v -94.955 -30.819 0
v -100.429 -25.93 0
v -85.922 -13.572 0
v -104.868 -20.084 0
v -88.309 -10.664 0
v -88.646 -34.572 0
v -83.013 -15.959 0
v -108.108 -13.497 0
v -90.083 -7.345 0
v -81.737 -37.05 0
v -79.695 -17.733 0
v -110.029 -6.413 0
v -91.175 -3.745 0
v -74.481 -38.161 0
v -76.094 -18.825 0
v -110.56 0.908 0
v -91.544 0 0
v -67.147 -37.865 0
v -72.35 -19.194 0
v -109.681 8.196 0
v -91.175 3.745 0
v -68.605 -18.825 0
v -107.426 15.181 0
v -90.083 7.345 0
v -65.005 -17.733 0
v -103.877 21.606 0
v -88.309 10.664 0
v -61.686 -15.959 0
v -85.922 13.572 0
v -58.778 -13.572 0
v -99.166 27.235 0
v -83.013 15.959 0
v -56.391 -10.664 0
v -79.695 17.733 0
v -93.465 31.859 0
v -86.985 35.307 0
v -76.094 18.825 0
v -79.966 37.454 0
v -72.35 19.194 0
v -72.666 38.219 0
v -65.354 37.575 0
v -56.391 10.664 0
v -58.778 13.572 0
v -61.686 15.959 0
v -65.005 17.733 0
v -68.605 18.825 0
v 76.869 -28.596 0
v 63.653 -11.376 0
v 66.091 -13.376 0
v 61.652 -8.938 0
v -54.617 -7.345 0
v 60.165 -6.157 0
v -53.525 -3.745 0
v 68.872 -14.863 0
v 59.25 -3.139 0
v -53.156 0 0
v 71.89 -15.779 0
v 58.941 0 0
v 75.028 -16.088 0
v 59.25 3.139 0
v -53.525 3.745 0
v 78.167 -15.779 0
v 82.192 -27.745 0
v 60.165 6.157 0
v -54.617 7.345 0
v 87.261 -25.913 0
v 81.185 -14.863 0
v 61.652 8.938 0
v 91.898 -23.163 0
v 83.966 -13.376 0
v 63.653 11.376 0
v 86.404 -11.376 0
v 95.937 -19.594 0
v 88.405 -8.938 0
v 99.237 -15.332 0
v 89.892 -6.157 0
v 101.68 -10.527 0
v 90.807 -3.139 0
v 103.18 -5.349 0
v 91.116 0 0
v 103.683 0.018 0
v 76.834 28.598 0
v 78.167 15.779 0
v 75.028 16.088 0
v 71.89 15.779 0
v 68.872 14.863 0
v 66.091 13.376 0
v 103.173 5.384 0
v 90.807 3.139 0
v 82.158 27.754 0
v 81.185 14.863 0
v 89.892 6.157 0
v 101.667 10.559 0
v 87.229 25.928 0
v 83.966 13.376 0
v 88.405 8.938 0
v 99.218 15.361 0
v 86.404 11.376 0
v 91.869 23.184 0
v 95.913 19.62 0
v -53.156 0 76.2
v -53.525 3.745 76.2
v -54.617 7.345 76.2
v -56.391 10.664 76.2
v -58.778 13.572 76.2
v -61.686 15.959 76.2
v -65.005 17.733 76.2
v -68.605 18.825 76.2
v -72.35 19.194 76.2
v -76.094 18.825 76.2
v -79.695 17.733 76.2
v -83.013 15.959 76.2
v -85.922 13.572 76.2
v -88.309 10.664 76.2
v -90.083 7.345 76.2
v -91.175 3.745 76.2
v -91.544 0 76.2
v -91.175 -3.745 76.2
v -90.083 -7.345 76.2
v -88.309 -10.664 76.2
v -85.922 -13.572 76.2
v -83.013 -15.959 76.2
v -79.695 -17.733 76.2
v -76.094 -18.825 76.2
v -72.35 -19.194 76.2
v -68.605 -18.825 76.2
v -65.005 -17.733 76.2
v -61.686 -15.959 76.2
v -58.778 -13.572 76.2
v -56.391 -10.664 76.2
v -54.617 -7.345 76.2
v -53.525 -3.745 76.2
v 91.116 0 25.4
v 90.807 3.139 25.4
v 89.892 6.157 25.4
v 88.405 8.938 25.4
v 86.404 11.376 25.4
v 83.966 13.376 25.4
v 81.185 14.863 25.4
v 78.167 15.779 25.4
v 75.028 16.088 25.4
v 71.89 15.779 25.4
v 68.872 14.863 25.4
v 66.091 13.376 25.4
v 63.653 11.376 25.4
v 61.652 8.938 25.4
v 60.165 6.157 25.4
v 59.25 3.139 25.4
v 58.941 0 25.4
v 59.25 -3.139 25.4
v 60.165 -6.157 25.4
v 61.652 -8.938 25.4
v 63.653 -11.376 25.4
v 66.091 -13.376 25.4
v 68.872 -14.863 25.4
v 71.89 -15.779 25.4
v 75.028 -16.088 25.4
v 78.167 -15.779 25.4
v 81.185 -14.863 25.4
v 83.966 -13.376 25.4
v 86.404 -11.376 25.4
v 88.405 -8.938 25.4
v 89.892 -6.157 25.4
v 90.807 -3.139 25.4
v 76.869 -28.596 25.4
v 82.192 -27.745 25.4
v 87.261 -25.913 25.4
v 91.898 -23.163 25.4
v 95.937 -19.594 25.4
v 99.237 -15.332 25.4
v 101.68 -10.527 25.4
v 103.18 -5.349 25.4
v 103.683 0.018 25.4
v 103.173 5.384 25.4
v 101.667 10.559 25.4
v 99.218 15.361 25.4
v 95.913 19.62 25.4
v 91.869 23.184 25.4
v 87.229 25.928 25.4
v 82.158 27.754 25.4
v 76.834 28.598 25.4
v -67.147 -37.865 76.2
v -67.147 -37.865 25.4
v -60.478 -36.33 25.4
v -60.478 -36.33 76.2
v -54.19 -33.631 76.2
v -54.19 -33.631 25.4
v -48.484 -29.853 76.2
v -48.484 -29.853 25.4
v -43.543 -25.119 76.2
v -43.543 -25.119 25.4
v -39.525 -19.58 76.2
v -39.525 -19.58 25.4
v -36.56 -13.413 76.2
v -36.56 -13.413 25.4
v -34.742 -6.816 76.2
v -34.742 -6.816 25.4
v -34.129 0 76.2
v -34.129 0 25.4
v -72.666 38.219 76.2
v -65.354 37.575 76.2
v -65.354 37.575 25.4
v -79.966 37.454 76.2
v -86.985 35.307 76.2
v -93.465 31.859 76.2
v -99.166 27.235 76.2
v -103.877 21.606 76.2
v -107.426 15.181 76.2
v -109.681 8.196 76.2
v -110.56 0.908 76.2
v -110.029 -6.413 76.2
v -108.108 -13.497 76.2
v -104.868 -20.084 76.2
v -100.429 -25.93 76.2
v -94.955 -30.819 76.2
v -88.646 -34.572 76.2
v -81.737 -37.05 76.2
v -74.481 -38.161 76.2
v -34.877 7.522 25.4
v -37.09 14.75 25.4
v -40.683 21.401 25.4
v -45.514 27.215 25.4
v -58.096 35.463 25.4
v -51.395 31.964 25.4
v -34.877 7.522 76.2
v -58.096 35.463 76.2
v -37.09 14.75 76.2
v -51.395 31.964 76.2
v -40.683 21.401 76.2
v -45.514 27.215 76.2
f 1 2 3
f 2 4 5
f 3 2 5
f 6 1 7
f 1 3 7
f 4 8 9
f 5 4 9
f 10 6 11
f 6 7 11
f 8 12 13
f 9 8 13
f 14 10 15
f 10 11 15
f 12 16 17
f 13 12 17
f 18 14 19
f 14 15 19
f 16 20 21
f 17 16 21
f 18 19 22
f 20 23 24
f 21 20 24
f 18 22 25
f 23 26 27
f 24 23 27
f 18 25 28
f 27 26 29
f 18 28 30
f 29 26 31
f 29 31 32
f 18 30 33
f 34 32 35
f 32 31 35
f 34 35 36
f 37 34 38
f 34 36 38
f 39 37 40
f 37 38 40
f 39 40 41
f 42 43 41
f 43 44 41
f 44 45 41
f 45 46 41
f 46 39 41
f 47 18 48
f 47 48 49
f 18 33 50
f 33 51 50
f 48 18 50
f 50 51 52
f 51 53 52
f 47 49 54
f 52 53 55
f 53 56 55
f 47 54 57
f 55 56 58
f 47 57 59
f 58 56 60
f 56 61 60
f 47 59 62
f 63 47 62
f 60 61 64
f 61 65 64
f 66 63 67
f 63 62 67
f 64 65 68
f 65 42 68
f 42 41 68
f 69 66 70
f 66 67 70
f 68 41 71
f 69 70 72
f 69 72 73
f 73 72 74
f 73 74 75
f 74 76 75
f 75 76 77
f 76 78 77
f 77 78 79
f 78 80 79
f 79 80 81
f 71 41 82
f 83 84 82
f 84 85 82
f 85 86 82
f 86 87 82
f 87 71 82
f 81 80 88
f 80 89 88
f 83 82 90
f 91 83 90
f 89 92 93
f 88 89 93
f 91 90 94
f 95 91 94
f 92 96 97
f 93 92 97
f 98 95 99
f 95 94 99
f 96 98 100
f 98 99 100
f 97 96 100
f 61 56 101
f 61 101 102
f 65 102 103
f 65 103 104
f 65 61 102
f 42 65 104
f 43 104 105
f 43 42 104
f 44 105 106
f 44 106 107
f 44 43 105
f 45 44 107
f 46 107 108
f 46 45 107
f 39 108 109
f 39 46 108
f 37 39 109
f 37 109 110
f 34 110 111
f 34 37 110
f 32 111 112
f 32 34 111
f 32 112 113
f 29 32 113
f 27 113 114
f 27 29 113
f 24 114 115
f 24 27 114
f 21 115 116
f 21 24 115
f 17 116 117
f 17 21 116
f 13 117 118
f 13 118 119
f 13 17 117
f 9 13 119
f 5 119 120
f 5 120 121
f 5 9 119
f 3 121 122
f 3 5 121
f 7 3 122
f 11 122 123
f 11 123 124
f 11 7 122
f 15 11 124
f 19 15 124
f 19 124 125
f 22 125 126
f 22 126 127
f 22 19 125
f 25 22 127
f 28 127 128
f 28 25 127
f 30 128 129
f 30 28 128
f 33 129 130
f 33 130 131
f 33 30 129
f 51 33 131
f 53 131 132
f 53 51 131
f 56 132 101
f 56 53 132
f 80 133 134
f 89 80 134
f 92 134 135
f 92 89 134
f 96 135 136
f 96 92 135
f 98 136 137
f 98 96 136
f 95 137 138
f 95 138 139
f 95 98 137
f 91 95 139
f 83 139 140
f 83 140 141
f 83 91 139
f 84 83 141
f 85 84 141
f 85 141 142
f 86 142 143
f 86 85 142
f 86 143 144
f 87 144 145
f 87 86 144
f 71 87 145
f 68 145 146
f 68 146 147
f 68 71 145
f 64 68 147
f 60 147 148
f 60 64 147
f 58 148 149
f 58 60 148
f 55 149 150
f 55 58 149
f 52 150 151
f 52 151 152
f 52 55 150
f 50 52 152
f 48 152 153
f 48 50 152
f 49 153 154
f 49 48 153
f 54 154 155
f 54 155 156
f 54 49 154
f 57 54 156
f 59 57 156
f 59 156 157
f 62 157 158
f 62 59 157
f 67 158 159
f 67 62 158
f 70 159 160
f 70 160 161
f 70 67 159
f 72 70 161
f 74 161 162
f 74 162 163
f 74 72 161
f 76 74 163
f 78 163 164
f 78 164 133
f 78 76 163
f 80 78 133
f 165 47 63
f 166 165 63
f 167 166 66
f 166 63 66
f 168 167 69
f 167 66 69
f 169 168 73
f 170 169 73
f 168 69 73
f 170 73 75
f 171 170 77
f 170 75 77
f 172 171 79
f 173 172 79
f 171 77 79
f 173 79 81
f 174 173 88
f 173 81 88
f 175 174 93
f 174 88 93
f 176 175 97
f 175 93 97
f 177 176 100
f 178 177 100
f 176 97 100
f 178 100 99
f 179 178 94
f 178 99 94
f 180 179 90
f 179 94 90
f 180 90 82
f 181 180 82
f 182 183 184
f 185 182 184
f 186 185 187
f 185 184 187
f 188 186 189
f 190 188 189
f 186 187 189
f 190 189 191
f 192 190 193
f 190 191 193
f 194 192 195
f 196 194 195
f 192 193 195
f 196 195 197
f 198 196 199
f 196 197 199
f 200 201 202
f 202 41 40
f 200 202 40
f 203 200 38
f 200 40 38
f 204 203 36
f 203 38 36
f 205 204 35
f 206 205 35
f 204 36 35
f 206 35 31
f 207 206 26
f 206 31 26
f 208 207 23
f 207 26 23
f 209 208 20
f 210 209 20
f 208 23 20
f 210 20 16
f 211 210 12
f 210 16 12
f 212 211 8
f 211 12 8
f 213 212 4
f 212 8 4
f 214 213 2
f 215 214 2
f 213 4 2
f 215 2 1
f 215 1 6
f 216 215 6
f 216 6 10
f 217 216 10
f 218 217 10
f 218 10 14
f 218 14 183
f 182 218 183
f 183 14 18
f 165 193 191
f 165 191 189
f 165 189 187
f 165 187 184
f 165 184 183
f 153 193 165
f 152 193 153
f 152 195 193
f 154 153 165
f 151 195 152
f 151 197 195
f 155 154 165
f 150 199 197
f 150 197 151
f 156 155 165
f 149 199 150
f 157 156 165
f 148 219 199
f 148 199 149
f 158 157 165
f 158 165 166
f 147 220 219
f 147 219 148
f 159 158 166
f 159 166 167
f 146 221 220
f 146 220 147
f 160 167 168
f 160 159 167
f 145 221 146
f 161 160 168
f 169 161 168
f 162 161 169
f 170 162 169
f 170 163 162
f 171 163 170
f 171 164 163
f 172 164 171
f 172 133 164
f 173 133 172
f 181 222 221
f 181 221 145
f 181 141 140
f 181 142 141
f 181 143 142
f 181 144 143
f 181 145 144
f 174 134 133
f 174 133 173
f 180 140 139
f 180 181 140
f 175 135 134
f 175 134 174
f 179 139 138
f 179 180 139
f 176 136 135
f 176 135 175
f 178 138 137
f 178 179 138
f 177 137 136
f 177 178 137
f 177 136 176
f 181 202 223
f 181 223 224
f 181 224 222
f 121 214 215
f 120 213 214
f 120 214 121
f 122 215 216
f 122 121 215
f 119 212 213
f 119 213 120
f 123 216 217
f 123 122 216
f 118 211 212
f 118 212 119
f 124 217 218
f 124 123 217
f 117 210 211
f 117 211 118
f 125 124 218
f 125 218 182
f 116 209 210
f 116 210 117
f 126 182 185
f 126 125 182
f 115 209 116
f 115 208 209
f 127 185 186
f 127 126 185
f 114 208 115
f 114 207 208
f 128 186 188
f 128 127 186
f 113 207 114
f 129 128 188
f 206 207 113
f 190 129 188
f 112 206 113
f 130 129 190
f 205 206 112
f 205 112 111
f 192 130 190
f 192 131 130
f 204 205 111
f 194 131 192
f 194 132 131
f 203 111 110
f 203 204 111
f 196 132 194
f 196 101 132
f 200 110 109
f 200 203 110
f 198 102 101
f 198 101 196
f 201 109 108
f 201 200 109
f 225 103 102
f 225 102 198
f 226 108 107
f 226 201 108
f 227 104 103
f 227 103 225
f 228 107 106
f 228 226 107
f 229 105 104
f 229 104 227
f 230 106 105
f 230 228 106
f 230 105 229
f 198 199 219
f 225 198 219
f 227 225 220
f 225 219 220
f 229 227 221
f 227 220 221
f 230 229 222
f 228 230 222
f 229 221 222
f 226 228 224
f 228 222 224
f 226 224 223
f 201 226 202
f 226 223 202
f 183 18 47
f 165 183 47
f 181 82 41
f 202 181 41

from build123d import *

# Parameters (mm, degrees)
F0_R     = 16.087734
F1_DEPTH = 25.4
F0_R_2   = 19.193831
F2_DEPTH = 76.2


with BuildPart() as f1:
    # F0 (on Top) → F1 (new body)
    with BuildSketch(Plane.XY):
        with BuildLine():
            ThreePointArc((-65.353721, 37.574831), (-42.954198, 24.427618), (-34.129272, 0))
            ThreePointArc((-34.129272, 0), (-43.542934, -25.119206), (-67.146784, -37.864785))
            Line((-67.146784, -37.864785), (76.868893, -28.595699))
            ThreePointArc((76.868893, -28.595699), (103.683287, 0.017515), (76.833934, 28.597927))
            Line((76.833934, 28.597927), (-65.353721, 37.574831))
        make_face()
        with Locations((75.028427, 0)):
            Circle(F0_R, mode=Mode.SUBTRACT)
    extrude(amount=F1_DEPTH)

    # F0 (on Top) → F2 (join)
    with BuildSketch(Plane.XY):
        with BuildLine():
            ThreePointArc((-67.146784, -37.864785), (-43.542934, -25.119206), (-34.129272, 0))
            ThreePointArc((-34.129272, 0), (-42.954198, 24.427618), (-65.353721, 37.574831))
            ThreePointArc((-65.353721, 37.574831), (-110.559674, 0.908178), (-67.146784, -37.864785))
        make_face()
        with Locations((-72.349869, 0)):
            Circle(F0_R_2, mode=Mode.SUBTRACT)
    extrude(amount=F2_DEPTH)


solid = f1.part
